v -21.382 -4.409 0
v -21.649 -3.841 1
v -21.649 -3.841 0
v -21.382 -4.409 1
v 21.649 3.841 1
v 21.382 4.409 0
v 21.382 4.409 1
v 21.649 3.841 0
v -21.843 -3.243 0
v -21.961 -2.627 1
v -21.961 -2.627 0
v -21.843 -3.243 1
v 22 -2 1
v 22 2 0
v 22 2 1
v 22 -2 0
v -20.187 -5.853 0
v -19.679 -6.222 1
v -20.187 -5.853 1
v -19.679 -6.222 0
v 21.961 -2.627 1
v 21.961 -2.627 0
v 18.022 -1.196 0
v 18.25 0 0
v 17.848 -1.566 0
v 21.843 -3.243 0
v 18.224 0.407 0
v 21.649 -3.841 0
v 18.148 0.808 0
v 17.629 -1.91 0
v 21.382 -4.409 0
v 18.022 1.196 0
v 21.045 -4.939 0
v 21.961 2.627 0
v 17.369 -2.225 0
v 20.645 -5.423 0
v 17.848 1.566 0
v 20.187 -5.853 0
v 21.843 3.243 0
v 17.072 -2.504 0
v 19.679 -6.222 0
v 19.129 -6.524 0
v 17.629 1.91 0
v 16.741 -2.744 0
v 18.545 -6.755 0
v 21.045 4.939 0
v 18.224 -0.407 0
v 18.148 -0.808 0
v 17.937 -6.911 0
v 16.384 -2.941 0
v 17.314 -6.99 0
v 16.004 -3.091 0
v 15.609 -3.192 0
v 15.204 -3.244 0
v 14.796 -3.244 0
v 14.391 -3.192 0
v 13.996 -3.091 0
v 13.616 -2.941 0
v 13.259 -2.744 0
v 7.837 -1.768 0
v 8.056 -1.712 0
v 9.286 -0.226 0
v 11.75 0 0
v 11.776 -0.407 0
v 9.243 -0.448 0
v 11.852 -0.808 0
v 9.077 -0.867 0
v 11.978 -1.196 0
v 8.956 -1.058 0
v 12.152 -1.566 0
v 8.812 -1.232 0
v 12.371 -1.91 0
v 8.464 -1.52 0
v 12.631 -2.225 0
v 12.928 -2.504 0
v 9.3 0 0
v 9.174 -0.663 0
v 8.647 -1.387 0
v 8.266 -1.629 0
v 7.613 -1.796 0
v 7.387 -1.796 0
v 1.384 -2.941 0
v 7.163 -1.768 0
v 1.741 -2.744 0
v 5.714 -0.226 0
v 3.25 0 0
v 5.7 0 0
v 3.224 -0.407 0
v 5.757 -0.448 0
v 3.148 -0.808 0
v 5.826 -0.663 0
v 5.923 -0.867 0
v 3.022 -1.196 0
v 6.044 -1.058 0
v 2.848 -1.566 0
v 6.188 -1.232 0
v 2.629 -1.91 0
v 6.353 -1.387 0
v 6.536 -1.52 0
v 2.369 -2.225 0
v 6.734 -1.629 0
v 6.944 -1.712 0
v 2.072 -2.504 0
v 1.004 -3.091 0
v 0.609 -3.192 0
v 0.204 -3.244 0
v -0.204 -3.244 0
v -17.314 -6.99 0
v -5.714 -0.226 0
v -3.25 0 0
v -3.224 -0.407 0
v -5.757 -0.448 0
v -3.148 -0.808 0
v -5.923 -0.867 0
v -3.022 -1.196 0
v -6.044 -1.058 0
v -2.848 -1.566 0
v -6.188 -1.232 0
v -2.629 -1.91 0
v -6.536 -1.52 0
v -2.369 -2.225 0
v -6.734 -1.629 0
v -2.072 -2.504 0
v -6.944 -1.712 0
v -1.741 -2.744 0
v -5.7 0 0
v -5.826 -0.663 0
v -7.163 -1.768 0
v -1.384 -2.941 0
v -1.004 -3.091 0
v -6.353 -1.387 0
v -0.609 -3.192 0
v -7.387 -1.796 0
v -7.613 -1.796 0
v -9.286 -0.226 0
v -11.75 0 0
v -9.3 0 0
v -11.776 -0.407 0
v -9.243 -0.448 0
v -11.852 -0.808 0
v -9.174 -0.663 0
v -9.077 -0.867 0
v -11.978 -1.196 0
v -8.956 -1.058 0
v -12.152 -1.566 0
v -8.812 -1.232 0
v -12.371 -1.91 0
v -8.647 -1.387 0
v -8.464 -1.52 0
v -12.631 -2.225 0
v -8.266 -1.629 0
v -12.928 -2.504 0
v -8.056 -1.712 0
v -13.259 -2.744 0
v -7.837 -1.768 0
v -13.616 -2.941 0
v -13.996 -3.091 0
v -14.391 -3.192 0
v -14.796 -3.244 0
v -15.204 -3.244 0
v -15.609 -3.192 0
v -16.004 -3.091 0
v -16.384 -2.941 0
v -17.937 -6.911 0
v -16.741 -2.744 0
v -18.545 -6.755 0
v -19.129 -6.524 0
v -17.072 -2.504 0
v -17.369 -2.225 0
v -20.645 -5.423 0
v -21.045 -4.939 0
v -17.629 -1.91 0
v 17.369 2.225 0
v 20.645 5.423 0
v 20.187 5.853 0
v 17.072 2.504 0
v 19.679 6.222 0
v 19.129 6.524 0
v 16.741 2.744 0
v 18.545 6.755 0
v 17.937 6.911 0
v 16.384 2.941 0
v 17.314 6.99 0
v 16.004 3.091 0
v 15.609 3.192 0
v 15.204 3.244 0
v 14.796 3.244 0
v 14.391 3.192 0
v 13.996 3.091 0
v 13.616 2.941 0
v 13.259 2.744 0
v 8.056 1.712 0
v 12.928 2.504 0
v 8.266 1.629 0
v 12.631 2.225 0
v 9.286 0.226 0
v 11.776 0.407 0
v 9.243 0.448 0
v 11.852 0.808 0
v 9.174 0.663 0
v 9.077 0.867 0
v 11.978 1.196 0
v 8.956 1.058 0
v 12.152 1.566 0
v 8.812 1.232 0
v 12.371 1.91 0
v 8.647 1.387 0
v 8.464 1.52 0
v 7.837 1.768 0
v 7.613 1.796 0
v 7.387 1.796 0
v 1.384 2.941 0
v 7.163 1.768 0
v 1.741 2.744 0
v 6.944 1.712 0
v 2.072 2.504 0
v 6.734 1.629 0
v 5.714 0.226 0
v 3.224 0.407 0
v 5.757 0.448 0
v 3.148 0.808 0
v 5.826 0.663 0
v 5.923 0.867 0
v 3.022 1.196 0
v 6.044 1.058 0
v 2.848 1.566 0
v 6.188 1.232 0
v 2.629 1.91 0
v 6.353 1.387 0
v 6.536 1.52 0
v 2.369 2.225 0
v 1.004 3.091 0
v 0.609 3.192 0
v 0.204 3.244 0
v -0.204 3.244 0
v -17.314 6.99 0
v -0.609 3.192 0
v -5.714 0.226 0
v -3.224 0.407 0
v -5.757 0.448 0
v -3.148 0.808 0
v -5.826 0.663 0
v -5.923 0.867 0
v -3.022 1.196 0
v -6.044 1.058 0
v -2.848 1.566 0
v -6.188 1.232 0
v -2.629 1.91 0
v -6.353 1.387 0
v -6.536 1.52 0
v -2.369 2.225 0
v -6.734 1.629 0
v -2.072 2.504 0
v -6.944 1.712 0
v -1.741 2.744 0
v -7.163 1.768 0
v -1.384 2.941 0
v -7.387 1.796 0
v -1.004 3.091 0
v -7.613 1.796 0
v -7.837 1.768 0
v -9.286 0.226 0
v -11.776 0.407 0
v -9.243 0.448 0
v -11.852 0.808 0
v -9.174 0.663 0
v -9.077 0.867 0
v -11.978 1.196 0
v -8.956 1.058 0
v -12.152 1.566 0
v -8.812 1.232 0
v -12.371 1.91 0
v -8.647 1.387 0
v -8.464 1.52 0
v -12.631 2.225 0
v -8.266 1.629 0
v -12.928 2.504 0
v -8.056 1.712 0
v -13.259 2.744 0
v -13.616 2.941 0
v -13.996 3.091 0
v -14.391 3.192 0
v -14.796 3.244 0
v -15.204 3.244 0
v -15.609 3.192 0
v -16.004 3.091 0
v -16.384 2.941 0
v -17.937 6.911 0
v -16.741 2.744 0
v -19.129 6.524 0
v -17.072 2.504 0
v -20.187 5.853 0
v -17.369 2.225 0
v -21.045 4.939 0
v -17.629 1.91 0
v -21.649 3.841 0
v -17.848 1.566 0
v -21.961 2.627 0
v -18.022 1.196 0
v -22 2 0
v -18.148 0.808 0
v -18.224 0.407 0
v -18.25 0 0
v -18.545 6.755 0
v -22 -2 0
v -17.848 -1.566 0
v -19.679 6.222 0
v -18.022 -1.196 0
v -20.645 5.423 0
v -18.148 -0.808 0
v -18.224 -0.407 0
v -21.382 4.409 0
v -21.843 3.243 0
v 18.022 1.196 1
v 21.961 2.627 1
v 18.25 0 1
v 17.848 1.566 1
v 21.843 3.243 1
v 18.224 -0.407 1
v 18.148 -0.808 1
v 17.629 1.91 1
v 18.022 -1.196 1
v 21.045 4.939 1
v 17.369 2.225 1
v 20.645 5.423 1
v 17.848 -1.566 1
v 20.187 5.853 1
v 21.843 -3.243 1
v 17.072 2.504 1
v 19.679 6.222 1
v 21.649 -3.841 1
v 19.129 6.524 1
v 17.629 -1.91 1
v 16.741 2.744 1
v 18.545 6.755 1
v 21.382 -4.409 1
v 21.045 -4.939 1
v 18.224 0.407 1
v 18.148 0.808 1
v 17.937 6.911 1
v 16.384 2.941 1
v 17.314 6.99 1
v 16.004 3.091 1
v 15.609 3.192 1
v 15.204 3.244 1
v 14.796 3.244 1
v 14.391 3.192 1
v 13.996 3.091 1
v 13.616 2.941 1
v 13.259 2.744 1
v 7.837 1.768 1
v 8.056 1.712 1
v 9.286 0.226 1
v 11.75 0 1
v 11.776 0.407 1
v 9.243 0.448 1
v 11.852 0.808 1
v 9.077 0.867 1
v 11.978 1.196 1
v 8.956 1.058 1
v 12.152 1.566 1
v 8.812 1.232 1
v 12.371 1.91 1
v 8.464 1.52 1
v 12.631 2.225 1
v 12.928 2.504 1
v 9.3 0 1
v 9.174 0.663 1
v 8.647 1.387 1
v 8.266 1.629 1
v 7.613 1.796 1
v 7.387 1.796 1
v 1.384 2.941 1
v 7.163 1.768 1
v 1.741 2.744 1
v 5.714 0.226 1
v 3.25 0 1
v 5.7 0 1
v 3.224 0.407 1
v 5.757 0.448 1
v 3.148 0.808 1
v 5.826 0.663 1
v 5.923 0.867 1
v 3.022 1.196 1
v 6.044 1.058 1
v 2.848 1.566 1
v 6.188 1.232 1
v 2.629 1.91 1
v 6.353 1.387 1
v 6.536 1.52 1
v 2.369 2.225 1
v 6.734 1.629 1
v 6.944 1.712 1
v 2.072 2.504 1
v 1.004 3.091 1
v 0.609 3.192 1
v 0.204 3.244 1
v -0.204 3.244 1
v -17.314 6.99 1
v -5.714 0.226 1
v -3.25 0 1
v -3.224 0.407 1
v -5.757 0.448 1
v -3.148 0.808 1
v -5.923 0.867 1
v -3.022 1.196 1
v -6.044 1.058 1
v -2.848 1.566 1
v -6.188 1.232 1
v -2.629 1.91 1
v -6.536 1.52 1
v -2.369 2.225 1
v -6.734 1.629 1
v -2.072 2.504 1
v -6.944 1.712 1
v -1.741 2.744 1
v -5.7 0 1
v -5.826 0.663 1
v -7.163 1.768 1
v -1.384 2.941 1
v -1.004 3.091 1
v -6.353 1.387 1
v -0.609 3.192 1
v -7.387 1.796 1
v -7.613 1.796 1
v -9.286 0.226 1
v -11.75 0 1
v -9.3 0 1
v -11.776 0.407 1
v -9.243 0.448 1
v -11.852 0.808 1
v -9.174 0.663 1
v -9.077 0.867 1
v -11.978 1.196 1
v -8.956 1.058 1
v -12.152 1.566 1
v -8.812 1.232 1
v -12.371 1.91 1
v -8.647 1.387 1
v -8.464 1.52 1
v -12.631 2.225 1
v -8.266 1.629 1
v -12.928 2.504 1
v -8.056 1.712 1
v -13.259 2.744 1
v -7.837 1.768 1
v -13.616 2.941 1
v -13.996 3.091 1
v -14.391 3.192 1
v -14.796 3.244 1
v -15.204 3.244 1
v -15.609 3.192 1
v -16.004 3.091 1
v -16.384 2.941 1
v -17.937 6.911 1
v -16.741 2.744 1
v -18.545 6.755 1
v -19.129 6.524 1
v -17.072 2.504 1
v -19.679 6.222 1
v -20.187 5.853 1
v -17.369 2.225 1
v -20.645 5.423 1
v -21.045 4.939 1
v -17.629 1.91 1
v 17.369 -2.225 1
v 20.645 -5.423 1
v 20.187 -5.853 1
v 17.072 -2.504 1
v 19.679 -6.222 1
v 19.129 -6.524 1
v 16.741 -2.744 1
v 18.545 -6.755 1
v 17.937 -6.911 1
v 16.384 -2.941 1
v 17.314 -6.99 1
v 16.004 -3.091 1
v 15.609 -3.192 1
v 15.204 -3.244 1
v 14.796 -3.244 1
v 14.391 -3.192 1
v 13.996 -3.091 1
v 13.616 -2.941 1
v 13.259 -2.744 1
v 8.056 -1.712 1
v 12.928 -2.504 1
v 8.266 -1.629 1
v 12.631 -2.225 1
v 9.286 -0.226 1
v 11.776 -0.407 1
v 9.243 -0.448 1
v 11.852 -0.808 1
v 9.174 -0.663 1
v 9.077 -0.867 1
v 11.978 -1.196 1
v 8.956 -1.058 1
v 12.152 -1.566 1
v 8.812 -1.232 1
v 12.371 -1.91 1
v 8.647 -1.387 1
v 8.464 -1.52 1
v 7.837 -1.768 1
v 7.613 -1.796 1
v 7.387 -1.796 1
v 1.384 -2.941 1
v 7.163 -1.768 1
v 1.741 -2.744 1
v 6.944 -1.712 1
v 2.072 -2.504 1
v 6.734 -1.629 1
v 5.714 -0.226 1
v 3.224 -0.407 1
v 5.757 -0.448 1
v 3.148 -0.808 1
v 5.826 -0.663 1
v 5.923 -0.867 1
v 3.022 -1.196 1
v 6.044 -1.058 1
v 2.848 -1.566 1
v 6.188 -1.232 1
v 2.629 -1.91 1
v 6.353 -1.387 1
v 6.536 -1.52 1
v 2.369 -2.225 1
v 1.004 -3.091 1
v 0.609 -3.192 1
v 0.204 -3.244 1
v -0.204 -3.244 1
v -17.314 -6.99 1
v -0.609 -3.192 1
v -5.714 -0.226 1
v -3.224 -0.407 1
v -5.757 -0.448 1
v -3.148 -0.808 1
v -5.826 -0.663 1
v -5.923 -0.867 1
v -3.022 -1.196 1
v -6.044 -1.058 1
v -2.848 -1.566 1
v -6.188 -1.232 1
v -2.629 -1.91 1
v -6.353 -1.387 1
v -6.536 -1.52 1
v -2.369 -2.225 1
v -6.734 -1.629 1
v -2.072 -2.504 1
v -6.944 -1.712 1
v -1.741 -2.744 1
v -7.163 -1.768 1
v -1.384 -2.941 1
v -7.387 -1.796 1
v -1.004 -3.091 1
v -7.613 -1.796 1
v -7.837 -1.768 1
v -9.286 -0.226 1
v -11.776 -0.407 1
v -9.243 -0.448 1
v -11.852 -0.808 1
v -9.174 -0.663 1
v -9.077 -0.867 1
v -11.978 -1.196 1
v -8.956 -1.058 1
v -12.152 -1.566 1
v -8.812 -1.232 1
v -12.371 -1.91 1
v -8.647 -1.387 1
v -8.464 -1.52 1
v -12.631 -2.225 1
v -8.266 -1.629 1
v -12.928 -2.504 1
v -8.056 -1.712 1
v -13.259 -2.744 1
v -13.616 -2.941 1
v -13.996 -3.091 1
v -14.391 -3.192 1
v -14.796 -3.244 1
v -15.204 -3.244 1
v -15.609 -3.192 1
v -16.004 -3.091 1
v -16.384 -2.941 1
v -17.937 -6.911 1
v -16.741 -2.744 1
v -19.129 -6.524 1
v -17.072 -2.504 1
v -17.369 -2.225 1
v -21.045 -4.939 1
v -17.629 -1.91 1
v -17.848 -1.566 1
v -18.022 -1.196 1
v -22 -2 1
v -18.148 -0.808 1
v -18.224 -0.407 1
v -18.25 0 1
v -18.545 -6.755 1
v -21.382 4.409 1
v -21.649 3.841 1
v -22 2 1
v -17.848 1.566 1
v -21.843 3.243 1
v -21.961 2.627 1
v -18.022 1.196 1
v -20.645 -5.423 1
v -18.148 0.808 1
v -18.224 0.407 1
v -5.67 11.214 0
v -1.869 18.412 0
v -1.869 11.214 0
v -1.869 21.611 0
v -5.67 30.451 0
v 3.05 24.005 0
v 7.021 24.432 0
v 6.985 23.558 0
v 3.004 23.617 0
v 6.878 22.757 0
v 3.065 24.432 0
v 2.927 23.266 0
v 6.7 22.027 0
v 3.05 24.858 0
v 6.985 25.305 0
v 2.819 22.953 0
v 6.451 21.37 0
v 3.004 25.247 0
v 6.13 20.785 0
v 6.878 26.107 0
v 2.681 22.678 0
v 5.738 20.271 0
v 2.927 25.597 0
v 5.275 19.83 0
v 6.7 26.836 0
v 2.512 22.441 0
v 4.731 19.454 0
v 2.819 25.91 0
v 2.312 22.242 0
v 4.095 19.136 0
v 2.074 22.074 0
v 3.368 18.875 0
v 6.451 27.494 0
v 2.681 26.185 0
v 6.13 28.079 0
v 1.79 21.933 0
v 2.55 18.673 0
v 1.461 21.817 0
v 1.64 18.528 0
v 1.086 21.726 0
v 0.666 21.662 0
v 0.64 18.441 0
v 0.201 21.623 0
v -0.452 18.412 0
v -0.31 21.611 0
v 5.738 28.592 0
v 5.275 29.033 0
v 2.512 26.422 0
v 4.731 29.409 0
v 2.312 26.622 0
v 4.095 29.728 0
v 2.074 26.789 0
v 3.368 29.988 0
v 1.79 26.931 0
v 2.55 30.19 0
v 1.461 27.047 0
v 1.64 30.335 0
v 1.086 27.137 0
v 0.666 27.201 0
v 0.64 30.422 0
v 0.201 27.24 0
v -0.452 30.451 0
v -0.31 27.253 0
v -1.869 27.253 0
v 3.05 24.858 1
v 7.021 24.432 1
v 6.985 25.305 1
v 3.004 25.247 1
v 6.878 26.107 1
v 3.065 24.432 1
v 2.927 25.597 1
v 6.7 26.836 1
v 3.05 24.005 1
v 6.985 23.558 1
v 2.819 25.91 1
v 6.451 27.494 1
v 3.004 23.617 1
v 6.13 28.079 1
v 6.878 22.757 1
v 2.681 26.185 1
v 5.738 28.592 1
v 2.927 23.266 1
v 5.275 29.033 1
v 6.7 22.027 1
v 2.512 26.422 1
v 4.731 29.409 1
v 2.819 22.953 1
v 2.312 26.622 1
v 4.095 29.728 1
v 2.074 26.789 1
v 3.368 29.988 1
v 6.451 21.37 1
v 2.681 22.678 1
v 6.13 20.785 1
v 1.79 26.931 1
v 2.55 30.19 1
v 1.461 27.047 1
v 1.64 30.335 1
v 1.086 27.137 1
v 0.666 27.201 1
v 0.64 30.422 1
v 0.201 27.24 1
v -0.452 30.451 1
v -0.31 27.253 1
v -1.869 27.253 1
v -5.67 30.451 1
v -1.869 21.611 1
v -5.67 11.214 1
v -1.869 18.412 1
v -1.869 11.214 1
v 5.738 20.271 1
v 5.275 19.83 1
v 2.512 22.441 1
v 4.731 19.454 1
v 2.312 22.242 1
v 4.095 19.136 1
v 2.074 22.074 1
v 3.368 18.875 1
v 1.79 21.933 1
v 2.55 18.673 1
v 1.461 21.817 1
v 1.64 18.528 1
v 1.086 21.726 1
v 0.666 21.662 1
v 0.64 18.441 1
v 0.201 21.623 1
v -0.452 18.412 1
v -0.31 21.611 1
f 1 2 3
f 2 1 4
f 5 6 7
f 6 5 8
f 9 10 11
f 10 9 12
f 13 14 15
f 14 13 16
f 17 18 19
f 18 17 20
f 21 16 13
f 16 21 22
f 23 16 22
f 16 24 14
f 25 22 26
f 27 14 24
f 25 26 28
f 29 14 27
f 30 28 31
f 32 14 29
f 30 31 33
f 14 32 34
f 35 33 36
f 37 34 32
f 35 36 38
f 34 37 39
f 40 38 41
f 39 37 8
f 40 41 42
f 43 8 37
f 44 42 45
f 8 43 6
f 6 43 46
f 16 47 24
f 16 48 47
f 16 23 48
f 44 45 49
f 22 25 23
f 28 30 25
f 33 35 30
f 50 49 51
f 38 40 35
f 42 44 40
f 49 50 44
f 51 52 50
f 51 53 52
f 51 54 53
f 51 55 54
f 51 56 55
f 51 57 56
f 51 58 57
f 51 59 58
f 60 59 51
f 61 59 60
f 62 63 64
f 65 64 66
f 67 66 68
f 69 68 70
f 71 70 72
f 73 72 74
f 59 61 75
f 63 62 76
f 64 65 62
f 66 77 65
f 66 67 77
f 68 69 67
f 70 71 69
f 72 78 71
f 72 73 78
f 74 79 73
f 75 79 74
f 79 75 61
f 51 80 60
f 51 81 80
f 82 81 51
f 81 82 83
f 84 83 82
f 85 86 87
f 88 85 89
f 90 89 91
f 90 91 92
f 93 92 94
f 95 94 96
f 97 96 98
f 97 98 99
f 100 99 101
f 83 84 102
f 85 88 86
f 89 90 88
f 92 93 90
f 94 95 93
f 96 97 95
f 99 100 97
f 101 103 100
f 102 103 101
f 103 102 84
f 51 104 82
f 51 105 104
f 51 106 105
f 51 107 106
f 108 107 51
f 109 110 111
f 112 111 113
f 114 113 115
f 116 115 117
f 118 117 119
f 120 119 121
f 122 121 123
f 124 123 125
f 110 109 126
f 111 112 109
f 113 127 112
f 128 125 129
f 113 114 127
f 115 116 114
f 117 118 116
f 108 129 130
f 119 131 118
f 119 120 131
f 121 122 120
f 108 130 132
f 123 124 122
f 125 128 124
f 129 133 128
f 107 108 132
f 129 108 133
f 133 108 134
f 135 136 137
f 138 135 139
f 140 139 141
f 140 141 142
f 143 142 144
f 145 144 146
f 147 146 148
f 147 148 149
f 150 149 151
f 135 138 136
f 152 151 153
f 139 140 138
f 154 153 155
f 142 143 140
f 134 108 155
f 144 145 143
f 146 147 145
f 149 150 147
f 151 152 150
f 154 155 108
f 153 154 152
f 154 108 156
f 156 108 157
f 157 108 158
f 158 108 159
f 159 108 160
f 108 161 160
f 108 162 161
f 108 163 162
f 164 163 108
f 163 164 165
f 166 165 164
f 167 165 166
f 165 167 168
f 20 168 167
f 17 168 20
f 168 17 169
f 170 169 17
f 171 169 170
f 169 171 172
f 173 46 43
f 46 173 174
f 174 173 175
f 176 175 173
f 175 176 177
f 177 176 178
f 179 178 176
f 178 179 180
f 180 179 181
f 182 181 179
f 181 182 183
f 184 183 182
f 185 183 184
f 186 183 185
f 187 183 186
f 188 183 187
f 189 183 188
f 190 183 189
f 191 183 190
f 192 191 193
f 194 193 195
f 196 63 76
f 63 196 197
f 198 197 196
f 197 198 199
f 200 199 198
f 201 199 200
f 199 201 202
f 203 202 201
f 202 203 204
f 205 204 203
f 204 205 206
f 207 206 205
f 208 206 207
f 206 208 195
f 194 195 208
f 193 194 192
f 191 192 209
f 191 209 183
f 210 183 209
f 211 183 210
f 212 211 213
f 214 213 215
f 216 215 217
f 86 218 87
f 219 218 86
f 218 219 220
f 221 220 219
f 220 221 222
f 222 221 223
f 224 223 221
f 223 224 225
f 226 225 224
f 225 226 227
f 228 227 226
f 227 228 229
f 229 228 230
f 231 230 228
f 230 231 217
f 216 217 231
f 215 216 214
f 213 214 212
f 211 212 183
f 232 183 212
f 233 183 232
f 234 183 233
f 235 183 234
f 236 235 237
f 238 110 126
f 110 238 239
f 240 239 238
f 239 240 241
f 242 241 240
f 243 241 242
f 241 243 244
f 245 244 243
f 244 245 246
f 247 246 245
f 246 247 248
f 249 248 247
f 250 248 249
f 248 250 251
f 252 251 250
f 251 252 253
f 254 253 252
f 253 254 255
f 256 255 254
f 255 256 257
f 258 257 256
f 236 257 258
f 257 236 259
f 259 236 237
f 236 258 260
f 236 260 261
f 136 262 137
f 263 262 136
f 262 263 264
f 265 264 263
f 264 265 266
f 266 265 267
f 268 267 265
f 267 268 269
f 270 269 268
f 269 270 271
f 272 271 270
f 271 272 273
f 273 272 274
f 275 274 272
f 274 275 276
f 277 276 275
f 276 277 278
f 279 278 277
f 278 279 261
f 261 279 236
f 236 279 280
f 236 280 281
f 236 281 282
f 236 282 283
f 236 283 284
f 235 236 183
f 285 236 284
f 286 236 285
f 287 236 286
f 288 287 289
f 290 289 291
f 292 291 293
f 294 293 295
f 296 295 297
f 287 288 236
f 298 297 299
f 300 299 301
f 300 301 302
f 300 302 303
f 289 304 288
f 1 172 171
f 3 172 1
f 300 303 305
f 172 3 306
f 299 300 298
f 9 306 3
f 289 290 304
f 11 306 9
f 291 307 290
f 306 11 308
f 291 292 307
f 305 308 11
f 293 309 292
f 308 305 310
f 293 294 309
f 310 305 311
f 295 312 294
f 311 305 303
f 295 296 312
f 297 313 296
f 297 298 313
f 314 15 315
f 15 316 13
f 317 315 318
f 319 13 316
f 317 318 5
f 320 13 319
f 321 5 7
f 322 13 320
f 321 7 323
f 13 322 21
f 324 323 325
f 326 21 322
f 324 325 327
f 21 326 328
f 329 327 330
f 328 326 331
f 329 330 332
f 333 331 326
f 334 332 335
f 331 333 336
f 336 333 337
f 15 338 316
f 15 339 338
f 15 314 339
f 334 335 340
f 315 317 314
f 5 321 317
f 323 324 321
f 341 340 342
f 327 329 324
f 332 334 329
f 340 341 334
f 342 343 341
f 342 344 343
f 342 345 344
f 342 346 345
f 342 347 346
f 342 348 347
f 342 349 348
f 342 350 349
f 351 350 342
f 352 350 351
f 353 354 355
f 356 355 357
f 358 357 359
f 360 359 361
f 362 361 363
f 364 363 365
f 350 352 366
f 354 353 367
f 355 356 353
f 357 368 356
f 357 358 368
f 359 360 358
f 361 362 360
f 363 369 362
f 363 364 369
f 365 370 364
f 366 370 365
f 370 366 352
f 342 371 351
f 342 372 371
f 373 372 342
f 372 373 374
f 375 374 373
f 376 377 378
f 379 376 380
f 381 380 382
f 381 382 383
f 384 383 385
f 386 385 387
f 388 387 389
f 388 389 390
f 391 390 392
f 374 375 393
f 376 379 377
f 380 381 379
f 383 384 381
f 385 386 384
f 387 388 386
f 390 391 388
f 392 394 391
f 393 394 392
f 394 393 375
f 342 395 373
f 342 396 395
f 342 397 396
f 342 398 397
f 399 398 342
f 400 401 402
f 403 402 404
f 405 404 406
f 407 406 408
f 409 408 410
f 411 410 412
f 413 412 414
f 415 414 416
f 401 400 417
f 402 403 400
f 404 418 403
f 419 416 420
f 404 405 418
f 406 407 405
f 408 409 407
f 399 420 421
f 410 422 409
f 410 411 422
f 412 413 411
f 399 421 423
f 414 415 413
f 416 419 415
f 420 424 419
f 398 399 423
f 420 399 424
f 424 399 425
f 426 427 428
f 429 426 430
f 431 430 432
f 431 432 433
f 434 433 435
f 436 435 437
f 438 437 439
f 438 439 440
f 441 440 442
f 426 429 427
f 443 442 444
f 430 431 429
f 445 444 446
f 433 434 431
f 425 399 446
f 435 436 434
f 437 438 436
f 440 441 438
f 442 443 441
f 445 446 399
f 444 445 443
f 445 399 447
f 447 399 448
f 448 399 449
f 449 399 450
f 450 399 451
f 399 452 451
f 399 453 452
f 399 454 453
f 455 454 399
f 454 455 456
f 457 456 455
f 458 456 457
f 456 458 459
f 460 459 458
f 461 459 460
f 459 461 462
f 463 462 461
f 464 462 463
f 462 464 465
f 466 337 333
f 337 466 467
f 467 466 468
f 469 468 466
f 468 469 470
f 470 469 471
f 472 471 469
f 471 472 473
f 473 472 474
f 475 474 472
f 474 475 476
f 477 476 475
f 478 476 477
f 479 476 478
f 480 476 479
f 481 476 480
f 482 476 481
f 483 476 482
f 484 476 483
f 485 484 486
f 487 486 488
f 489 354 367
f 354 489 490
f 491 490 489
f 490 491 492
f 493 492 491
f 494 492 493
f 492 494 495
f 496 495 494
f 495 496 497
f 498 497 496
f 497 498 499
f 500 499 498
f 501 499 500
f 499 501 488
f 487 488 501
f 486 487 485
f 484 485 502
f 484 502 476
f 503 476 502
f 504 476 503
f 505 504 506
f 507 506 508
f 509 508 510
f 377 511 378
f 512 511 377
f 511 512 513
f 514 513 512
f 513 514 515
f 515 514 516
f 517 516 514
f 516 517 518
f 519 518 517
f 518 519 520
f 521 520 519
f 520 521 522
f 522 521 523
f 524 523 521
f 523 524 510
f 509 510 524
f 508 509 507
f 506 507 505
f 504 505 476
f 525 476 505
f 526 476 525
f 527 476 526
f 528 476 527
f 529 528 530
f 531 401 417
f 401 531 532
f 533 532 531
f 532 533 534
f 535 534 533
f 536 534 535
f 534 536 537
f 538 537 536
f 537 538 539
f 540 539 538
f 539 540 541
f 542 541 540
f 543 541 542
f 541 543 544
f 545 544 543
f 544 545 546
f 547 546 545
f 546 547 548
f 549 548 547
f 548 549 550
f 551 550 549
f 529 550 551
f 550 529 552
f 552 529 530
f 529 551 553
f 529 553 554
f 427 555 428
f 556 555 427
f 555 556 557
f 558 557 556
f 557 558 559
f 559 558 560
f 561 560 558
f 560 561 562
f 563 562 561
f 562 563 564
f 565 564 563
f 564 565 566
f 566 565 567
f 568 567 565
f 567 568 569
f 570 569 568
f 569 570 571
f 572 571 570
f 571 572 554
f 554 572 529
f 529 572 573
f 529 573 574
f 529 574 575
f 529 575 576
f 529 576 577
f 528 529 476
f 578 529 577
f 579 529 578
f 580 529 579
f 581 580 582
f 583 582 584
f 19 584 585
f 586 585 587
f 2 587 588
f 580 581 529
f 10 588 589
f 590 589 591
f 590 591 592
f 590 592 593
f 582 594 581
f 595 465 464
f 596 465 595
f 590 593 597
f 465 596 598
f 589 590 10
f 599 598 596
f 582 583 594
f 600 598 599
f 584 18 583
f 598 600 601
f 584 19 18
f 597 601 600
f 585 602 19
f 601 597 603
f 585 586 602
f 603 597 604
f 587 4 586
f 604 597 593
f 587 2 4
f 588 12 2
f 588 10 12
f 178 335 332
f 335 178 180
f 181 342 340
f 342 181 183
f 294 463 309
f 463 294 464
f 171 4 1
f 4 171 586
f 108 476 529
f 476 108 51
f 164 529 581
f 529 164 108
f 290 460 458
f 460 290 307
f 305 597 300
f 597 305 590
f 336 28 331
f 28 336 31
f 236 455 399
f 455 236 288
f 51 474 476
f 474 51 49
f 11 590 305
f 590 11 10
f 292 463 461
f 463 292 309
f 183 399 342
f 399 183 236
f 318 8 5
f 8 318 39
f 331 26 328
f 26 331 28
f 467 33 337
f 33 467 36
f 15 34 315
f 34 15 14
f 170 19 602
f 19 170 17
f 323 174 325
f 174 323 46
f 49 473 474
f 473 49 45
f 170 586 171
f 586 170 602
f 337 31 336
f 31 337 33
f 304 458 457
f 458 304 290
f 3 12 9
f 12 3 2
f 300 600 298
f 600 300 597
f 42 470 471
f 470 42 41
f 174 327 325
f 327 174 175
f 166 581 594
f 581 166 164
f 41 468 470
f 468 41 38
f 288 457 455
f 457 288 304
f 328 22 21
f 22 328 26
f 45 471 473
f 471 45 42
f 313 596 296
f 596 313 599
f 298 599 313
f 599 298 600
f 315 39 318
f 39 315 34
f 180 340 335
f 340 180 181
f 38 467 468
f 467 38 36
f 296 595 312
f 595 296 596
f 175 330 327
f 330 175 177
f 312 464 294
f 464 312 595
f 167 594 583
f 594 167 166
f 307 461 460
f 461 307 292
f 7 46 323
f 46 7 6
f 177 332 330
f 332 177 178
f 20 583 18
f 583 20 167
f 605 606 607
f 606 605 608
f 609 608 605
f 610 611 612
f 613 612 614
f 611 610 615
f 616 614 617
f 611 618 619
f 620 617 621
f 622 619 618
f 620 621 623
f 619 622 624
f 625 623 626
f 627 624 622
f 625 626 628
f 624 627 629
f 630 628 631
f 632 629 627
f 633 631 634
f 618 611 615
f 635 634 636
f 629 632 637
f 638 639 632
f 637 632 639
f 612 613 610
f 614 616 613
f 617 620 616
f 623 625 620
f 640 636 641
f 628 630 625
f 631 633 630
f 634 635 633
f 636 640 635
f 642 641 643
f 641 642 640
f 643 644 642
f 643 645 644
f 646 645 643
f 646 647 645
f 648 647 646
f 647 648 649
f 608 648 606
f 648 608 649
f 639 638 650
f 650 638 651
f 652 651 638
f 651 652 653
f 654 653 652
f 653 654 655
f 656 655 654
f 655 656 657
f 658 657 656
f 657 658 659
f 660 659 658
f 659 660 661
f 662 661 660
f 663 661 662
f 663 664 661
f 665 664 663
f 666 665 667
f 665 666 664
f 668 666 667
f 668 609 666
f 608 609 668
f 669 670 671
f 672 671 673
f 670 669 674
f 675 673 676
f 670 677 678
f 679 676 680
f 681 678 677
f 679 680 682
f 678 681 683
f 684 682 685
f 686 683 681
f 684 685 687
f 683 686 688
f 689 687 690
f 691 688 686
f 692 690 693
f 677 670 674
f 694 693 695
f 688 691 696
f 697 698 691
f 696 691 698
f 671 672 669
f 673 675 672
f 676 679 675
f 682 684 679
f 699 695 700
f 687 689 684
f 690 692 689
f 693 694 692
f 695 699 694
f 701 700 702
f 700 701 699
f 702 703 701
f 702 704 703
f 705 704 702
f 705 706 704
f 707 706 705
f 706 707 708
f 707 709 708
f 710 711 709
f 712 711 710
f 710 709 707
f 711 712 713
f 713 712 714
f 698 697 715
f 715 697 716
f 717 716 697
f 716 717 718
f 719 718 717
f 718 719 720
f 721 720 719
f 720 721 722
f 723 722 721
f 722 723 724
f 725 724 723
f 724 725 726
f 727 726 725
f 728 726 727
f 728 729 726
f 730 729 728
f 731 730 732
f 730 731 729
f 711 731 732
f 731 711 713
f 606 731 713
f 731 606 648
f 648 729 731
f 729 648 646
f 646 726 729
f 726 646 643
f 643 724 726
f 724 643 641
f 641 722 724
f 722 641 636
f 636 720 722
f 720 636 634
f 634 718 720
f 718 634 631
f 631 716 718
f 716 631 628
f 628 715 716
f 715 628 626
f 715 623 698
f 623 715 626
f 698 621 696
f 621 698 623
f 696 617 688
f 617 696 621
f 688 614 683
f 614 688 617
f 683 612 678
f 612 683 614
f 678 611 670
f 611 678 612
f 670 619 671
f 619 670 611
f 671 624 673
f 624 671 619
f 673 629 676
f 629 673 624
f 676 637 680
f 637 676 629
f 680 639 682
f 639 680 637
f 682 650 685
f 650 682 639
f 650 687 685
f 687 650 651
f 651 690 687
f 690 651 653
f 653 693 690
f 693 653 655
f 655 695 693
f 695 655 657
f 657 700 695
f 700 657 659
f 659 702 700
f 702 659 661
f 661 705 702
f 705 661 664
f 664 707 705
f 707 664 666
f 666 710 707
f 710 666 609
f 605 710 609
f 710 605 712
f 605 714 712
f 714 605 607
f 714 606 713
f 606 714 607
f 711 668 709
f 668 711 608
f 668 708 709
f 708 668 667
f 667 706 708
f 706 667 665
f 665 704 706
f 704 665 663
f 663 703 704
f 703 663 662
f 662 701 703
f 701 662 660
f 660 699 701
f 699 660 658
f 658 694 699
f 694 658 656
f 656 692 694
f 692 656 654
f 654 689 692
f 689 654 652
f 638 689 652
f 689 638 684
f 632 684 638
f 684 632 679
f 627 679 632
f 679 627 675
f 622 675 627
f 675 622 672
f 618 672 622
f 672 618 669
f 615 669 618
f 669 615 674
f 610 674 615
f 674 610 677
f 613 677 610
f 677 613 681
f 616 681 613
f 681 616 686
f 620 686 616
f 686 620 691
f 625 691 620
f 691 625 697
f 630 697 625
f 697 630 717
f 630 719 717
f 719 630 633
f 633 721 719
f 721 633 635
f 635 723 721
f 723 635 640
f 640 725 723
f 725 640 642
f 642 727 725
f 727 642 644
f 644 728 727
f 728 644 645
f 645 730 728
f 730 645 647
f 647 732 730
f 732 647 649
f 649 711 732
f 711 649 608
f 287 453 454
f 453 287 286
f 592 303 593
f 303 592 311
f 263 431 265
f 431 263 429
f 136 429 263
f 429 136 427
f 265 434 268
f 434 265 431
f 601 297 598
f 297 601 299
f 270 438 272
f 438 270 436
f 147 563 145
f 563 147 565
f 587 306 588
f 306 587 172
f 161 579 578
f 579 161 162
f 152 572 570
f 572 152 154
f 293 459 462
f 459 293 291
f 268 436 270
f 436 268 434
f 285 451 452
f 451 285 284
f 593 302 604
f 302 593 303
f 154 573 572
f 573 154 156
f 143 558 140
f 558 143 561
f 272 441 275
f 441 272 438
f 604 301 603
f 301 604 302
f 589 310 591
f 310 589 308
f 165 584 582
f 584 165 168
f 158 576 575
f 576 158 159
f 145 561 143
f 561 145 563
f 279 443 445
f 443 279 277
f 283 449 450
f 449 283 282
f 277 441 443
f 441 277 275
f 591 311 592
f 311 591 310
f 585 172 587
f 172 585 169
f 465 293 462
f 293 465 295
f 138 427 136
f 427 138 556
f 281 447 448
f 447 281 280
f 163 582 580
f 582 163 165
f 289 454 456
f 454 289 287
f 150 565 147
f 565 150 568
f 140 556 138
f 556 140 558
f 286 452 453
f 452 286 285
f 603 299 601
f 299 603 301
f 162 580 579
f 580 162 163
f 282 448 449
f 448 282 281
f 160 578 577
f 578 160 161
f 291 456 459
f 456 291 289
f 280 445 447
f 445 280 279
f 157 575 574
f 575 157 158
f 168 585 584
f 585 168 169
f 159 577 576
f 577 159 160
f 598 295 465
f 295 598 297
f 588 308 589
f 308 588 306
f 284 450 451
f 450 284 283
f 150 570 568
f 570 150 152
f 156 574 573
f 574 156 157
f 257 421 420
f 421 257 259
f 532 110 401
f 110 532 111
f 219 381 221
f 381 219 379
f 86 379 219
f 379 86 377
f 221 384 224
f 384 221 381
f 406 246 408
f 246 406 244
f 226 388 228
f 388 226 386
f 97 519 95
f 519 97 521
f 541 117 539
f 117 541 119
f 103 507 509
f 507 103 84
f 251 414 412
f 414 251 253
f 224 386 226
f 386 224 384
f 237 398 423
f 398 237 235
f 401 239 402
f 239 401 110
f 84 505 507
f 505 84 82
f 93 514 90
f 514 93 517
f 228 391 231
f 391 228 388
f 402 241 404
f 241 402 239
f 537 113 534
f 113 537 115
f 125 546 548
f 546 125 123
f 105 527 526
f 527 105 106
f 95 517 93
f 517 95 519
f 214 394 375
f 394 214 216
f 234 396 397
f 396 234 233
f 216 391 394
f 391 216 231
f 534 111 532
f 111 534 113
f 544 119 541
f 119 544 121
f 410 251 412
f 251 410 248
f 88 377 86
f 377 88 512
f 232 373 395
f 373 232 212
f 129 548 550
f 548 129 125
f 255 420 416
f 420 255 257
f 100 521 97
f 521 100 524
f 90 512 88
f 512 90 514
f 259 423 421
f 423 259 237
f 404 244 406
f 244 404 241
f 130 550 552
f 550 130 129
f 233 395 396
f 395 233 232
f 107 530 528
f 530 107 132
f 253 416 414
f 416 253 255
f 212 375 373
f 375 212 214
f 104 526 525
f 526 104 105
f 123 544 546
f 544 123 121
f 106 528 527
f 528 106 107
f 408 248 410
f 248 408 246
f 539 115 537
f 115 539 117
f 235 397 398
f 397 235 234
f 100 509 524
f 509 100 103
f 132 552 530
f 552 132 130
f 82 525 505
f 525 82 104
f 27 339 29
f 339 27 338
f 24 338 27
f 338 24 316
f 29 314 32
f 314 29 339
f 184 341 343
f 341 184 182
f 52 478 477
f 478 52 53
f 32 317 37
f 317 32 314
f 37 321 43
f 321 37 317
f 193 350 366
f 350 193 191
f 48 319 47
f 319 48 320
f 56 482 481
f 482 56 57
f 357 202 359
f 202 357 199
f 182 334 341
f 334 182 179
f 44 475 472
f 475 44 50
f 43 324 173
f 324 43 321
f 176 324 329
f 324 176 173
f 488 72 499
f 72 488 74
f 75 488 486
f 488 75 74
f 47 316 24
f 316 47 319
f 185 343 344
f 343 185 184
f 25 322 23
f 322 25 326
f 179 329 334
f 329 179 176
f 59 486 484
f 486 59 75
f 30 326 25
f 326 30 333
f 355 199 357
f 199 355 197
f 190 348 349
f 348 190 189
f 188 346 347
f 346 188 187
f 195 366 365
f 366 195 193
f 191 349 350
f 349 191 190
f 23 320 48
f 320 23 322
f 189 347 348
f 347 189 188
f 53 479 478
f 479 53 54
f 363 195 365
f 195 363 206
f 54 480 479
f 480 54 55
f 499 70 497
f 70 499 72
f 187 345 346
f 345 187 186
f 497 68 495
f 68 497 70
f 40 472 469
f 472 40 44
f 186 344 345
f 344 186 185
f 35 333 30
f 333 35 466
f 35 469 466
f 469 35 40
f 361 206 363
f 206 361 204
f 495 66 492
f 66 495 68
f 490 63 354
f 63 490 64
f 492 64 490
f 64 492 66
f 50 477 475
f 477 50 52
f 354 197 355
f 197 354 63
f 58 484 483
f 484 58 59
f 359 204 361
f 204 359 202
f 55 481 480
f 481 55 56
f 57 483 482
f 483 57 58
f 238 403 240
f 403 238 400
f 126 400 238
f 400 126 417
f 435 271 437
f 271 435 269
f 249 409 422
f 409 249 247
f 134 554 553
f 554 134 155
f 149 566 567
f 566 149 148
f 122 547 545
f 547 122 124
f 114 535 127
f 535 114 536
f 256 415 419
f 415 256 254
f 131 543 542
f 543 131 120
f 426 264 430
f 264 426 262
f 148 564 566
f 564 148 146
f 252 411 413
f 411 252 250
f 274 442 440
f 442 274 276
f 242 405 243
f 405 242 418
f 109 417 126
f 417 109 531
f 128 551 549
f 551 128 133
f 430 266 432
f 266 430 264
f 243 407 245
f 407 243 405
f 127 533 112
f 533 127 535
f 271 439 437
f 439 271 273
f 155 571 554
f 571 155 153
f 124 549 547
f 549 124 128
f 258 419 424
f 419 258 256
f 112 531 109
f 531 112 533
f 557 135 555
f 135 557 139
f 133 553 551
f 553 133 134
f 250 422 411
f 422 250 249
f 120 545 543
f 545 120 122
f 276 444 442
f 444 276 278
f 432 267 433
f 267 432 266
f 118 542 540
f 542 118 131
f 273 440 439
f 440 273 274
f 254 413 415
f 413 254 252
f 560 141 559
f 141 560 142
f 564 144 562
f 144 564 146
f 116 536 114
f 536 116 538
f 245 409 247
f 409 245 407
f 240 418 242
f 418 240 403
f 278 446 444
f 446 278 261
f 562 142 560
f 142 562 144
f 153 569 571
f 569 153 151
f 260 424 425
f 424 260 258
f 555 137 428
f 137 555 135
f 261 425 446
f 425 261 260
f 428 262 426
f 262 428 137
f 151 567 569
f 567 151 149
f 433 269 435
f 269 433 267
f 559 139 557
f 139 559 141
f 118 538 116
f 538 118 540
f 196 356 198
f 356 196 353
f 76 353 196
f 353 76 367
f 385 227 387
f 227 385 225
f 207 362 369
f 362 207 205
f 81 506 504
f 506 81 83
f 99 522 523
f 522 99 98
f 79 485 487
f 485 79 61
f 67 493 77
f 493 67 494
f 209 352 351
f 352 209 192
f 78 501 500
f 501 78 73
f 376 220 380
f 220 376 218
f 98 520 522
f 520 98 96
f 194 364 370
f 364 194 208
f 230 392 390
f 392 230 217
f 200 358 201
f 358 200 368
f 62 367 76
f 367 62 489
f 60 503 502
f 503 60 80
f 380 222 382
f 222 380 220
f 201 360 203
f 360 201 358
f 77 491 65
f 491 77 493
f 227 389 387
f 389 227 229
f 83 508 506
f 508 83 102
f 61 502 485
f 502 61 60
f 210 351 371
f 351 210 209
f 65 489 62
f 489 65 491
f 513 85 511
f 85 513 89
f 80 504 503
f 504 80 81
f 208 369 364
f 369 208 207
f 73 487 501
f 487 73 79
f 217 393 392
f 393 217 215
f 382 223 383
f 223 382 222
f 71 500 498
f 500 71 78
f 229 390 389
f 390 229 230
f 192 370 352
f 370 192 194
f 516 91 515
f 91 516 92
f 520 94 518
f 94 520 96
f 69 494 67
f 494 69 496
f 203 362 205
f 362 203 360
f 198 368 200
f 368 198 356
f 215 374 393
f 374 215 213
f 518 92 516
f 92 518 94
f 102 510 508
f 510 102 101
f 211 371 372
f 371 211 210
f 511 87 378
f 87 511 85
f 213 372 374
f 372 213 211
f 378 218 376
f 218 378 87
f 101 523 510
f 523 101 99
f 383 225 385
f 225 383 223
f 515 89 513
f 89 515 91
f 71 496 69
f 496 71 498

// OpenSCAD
$fn = 50;


difference() {
	union() {
		hull() {
			translate(v = [-17.0000000000, 2.0000000000, 0]) {
				cylinder(h = 1, r = 5);
			}
			translate(v = [17.0000000000, 2.0000000000, 0]) {
				cylinder(h = 1, r = 5);
			}
			translate(v = [-17.0000000000, -2.0000000000, 0]) {
				cylinder(h = 1, r = 5);
			}
			translate(v = [17.0000000000, -2.0000000000, 0]) {
				cylinder(h = 1, r = 5);
			}
		}
		translate(v = [0, 30.0000000000, 0]) {
			linear_extrude(height = 1) {
				text(font = "DejaVu Sans Mono:style=Bold", halign = "center", size = 19.0000000000, text = "P", valign = "top");
			}
		}
	}
	union() {
		translate(v = [-15.0000000000, 0.0000000000, 0]) {
			translate(v = [0, 0, -100]) {
				cylinder(h = 200, r = 3.2500000000);
			}
		}
		translate(v = [0, 0, -100]) {
			cylinder(h = 200, r = 3.2500000000);
		}
		translate(v = [15.0000000000, 0.0000000000, 0]) {
			translate(v = [0, 0, -100]) {
				cylinder(h = 200, r = 3.2500000000);
			}
		}
		translate(v = [-15.0000000000, 0.0000000000, 0]) {
			translate(v = [0, 0, -100]) {
				cylinder(h = 200, r = 1.8000000000);
			}
		}
		translate(v = [-7.5000000000, 0.0000000000, 0]) {
			translate(v = [0, 0, -100]) {
				cylinder(h = 200, r = 1.8000000000);
			}
		}
		translate(v = [0, 0, -100]) {
			cylinder(h = 200, r = 1.8000000000);
		}
		translate(v = [7.5000000000, 0.0000000000, 0]) {
			translate(v = [0, 0, -100]) {
				cylinder(h = 200, r = 1.8000000000);
			}
		}
		translate(v = [15.0000000000, 0.0000000000, 0]) {
			translate(v = [0, 0, -100]) {
				cylinder(h = 200, r = 1.8000000000);
			}
		}
	}
}
